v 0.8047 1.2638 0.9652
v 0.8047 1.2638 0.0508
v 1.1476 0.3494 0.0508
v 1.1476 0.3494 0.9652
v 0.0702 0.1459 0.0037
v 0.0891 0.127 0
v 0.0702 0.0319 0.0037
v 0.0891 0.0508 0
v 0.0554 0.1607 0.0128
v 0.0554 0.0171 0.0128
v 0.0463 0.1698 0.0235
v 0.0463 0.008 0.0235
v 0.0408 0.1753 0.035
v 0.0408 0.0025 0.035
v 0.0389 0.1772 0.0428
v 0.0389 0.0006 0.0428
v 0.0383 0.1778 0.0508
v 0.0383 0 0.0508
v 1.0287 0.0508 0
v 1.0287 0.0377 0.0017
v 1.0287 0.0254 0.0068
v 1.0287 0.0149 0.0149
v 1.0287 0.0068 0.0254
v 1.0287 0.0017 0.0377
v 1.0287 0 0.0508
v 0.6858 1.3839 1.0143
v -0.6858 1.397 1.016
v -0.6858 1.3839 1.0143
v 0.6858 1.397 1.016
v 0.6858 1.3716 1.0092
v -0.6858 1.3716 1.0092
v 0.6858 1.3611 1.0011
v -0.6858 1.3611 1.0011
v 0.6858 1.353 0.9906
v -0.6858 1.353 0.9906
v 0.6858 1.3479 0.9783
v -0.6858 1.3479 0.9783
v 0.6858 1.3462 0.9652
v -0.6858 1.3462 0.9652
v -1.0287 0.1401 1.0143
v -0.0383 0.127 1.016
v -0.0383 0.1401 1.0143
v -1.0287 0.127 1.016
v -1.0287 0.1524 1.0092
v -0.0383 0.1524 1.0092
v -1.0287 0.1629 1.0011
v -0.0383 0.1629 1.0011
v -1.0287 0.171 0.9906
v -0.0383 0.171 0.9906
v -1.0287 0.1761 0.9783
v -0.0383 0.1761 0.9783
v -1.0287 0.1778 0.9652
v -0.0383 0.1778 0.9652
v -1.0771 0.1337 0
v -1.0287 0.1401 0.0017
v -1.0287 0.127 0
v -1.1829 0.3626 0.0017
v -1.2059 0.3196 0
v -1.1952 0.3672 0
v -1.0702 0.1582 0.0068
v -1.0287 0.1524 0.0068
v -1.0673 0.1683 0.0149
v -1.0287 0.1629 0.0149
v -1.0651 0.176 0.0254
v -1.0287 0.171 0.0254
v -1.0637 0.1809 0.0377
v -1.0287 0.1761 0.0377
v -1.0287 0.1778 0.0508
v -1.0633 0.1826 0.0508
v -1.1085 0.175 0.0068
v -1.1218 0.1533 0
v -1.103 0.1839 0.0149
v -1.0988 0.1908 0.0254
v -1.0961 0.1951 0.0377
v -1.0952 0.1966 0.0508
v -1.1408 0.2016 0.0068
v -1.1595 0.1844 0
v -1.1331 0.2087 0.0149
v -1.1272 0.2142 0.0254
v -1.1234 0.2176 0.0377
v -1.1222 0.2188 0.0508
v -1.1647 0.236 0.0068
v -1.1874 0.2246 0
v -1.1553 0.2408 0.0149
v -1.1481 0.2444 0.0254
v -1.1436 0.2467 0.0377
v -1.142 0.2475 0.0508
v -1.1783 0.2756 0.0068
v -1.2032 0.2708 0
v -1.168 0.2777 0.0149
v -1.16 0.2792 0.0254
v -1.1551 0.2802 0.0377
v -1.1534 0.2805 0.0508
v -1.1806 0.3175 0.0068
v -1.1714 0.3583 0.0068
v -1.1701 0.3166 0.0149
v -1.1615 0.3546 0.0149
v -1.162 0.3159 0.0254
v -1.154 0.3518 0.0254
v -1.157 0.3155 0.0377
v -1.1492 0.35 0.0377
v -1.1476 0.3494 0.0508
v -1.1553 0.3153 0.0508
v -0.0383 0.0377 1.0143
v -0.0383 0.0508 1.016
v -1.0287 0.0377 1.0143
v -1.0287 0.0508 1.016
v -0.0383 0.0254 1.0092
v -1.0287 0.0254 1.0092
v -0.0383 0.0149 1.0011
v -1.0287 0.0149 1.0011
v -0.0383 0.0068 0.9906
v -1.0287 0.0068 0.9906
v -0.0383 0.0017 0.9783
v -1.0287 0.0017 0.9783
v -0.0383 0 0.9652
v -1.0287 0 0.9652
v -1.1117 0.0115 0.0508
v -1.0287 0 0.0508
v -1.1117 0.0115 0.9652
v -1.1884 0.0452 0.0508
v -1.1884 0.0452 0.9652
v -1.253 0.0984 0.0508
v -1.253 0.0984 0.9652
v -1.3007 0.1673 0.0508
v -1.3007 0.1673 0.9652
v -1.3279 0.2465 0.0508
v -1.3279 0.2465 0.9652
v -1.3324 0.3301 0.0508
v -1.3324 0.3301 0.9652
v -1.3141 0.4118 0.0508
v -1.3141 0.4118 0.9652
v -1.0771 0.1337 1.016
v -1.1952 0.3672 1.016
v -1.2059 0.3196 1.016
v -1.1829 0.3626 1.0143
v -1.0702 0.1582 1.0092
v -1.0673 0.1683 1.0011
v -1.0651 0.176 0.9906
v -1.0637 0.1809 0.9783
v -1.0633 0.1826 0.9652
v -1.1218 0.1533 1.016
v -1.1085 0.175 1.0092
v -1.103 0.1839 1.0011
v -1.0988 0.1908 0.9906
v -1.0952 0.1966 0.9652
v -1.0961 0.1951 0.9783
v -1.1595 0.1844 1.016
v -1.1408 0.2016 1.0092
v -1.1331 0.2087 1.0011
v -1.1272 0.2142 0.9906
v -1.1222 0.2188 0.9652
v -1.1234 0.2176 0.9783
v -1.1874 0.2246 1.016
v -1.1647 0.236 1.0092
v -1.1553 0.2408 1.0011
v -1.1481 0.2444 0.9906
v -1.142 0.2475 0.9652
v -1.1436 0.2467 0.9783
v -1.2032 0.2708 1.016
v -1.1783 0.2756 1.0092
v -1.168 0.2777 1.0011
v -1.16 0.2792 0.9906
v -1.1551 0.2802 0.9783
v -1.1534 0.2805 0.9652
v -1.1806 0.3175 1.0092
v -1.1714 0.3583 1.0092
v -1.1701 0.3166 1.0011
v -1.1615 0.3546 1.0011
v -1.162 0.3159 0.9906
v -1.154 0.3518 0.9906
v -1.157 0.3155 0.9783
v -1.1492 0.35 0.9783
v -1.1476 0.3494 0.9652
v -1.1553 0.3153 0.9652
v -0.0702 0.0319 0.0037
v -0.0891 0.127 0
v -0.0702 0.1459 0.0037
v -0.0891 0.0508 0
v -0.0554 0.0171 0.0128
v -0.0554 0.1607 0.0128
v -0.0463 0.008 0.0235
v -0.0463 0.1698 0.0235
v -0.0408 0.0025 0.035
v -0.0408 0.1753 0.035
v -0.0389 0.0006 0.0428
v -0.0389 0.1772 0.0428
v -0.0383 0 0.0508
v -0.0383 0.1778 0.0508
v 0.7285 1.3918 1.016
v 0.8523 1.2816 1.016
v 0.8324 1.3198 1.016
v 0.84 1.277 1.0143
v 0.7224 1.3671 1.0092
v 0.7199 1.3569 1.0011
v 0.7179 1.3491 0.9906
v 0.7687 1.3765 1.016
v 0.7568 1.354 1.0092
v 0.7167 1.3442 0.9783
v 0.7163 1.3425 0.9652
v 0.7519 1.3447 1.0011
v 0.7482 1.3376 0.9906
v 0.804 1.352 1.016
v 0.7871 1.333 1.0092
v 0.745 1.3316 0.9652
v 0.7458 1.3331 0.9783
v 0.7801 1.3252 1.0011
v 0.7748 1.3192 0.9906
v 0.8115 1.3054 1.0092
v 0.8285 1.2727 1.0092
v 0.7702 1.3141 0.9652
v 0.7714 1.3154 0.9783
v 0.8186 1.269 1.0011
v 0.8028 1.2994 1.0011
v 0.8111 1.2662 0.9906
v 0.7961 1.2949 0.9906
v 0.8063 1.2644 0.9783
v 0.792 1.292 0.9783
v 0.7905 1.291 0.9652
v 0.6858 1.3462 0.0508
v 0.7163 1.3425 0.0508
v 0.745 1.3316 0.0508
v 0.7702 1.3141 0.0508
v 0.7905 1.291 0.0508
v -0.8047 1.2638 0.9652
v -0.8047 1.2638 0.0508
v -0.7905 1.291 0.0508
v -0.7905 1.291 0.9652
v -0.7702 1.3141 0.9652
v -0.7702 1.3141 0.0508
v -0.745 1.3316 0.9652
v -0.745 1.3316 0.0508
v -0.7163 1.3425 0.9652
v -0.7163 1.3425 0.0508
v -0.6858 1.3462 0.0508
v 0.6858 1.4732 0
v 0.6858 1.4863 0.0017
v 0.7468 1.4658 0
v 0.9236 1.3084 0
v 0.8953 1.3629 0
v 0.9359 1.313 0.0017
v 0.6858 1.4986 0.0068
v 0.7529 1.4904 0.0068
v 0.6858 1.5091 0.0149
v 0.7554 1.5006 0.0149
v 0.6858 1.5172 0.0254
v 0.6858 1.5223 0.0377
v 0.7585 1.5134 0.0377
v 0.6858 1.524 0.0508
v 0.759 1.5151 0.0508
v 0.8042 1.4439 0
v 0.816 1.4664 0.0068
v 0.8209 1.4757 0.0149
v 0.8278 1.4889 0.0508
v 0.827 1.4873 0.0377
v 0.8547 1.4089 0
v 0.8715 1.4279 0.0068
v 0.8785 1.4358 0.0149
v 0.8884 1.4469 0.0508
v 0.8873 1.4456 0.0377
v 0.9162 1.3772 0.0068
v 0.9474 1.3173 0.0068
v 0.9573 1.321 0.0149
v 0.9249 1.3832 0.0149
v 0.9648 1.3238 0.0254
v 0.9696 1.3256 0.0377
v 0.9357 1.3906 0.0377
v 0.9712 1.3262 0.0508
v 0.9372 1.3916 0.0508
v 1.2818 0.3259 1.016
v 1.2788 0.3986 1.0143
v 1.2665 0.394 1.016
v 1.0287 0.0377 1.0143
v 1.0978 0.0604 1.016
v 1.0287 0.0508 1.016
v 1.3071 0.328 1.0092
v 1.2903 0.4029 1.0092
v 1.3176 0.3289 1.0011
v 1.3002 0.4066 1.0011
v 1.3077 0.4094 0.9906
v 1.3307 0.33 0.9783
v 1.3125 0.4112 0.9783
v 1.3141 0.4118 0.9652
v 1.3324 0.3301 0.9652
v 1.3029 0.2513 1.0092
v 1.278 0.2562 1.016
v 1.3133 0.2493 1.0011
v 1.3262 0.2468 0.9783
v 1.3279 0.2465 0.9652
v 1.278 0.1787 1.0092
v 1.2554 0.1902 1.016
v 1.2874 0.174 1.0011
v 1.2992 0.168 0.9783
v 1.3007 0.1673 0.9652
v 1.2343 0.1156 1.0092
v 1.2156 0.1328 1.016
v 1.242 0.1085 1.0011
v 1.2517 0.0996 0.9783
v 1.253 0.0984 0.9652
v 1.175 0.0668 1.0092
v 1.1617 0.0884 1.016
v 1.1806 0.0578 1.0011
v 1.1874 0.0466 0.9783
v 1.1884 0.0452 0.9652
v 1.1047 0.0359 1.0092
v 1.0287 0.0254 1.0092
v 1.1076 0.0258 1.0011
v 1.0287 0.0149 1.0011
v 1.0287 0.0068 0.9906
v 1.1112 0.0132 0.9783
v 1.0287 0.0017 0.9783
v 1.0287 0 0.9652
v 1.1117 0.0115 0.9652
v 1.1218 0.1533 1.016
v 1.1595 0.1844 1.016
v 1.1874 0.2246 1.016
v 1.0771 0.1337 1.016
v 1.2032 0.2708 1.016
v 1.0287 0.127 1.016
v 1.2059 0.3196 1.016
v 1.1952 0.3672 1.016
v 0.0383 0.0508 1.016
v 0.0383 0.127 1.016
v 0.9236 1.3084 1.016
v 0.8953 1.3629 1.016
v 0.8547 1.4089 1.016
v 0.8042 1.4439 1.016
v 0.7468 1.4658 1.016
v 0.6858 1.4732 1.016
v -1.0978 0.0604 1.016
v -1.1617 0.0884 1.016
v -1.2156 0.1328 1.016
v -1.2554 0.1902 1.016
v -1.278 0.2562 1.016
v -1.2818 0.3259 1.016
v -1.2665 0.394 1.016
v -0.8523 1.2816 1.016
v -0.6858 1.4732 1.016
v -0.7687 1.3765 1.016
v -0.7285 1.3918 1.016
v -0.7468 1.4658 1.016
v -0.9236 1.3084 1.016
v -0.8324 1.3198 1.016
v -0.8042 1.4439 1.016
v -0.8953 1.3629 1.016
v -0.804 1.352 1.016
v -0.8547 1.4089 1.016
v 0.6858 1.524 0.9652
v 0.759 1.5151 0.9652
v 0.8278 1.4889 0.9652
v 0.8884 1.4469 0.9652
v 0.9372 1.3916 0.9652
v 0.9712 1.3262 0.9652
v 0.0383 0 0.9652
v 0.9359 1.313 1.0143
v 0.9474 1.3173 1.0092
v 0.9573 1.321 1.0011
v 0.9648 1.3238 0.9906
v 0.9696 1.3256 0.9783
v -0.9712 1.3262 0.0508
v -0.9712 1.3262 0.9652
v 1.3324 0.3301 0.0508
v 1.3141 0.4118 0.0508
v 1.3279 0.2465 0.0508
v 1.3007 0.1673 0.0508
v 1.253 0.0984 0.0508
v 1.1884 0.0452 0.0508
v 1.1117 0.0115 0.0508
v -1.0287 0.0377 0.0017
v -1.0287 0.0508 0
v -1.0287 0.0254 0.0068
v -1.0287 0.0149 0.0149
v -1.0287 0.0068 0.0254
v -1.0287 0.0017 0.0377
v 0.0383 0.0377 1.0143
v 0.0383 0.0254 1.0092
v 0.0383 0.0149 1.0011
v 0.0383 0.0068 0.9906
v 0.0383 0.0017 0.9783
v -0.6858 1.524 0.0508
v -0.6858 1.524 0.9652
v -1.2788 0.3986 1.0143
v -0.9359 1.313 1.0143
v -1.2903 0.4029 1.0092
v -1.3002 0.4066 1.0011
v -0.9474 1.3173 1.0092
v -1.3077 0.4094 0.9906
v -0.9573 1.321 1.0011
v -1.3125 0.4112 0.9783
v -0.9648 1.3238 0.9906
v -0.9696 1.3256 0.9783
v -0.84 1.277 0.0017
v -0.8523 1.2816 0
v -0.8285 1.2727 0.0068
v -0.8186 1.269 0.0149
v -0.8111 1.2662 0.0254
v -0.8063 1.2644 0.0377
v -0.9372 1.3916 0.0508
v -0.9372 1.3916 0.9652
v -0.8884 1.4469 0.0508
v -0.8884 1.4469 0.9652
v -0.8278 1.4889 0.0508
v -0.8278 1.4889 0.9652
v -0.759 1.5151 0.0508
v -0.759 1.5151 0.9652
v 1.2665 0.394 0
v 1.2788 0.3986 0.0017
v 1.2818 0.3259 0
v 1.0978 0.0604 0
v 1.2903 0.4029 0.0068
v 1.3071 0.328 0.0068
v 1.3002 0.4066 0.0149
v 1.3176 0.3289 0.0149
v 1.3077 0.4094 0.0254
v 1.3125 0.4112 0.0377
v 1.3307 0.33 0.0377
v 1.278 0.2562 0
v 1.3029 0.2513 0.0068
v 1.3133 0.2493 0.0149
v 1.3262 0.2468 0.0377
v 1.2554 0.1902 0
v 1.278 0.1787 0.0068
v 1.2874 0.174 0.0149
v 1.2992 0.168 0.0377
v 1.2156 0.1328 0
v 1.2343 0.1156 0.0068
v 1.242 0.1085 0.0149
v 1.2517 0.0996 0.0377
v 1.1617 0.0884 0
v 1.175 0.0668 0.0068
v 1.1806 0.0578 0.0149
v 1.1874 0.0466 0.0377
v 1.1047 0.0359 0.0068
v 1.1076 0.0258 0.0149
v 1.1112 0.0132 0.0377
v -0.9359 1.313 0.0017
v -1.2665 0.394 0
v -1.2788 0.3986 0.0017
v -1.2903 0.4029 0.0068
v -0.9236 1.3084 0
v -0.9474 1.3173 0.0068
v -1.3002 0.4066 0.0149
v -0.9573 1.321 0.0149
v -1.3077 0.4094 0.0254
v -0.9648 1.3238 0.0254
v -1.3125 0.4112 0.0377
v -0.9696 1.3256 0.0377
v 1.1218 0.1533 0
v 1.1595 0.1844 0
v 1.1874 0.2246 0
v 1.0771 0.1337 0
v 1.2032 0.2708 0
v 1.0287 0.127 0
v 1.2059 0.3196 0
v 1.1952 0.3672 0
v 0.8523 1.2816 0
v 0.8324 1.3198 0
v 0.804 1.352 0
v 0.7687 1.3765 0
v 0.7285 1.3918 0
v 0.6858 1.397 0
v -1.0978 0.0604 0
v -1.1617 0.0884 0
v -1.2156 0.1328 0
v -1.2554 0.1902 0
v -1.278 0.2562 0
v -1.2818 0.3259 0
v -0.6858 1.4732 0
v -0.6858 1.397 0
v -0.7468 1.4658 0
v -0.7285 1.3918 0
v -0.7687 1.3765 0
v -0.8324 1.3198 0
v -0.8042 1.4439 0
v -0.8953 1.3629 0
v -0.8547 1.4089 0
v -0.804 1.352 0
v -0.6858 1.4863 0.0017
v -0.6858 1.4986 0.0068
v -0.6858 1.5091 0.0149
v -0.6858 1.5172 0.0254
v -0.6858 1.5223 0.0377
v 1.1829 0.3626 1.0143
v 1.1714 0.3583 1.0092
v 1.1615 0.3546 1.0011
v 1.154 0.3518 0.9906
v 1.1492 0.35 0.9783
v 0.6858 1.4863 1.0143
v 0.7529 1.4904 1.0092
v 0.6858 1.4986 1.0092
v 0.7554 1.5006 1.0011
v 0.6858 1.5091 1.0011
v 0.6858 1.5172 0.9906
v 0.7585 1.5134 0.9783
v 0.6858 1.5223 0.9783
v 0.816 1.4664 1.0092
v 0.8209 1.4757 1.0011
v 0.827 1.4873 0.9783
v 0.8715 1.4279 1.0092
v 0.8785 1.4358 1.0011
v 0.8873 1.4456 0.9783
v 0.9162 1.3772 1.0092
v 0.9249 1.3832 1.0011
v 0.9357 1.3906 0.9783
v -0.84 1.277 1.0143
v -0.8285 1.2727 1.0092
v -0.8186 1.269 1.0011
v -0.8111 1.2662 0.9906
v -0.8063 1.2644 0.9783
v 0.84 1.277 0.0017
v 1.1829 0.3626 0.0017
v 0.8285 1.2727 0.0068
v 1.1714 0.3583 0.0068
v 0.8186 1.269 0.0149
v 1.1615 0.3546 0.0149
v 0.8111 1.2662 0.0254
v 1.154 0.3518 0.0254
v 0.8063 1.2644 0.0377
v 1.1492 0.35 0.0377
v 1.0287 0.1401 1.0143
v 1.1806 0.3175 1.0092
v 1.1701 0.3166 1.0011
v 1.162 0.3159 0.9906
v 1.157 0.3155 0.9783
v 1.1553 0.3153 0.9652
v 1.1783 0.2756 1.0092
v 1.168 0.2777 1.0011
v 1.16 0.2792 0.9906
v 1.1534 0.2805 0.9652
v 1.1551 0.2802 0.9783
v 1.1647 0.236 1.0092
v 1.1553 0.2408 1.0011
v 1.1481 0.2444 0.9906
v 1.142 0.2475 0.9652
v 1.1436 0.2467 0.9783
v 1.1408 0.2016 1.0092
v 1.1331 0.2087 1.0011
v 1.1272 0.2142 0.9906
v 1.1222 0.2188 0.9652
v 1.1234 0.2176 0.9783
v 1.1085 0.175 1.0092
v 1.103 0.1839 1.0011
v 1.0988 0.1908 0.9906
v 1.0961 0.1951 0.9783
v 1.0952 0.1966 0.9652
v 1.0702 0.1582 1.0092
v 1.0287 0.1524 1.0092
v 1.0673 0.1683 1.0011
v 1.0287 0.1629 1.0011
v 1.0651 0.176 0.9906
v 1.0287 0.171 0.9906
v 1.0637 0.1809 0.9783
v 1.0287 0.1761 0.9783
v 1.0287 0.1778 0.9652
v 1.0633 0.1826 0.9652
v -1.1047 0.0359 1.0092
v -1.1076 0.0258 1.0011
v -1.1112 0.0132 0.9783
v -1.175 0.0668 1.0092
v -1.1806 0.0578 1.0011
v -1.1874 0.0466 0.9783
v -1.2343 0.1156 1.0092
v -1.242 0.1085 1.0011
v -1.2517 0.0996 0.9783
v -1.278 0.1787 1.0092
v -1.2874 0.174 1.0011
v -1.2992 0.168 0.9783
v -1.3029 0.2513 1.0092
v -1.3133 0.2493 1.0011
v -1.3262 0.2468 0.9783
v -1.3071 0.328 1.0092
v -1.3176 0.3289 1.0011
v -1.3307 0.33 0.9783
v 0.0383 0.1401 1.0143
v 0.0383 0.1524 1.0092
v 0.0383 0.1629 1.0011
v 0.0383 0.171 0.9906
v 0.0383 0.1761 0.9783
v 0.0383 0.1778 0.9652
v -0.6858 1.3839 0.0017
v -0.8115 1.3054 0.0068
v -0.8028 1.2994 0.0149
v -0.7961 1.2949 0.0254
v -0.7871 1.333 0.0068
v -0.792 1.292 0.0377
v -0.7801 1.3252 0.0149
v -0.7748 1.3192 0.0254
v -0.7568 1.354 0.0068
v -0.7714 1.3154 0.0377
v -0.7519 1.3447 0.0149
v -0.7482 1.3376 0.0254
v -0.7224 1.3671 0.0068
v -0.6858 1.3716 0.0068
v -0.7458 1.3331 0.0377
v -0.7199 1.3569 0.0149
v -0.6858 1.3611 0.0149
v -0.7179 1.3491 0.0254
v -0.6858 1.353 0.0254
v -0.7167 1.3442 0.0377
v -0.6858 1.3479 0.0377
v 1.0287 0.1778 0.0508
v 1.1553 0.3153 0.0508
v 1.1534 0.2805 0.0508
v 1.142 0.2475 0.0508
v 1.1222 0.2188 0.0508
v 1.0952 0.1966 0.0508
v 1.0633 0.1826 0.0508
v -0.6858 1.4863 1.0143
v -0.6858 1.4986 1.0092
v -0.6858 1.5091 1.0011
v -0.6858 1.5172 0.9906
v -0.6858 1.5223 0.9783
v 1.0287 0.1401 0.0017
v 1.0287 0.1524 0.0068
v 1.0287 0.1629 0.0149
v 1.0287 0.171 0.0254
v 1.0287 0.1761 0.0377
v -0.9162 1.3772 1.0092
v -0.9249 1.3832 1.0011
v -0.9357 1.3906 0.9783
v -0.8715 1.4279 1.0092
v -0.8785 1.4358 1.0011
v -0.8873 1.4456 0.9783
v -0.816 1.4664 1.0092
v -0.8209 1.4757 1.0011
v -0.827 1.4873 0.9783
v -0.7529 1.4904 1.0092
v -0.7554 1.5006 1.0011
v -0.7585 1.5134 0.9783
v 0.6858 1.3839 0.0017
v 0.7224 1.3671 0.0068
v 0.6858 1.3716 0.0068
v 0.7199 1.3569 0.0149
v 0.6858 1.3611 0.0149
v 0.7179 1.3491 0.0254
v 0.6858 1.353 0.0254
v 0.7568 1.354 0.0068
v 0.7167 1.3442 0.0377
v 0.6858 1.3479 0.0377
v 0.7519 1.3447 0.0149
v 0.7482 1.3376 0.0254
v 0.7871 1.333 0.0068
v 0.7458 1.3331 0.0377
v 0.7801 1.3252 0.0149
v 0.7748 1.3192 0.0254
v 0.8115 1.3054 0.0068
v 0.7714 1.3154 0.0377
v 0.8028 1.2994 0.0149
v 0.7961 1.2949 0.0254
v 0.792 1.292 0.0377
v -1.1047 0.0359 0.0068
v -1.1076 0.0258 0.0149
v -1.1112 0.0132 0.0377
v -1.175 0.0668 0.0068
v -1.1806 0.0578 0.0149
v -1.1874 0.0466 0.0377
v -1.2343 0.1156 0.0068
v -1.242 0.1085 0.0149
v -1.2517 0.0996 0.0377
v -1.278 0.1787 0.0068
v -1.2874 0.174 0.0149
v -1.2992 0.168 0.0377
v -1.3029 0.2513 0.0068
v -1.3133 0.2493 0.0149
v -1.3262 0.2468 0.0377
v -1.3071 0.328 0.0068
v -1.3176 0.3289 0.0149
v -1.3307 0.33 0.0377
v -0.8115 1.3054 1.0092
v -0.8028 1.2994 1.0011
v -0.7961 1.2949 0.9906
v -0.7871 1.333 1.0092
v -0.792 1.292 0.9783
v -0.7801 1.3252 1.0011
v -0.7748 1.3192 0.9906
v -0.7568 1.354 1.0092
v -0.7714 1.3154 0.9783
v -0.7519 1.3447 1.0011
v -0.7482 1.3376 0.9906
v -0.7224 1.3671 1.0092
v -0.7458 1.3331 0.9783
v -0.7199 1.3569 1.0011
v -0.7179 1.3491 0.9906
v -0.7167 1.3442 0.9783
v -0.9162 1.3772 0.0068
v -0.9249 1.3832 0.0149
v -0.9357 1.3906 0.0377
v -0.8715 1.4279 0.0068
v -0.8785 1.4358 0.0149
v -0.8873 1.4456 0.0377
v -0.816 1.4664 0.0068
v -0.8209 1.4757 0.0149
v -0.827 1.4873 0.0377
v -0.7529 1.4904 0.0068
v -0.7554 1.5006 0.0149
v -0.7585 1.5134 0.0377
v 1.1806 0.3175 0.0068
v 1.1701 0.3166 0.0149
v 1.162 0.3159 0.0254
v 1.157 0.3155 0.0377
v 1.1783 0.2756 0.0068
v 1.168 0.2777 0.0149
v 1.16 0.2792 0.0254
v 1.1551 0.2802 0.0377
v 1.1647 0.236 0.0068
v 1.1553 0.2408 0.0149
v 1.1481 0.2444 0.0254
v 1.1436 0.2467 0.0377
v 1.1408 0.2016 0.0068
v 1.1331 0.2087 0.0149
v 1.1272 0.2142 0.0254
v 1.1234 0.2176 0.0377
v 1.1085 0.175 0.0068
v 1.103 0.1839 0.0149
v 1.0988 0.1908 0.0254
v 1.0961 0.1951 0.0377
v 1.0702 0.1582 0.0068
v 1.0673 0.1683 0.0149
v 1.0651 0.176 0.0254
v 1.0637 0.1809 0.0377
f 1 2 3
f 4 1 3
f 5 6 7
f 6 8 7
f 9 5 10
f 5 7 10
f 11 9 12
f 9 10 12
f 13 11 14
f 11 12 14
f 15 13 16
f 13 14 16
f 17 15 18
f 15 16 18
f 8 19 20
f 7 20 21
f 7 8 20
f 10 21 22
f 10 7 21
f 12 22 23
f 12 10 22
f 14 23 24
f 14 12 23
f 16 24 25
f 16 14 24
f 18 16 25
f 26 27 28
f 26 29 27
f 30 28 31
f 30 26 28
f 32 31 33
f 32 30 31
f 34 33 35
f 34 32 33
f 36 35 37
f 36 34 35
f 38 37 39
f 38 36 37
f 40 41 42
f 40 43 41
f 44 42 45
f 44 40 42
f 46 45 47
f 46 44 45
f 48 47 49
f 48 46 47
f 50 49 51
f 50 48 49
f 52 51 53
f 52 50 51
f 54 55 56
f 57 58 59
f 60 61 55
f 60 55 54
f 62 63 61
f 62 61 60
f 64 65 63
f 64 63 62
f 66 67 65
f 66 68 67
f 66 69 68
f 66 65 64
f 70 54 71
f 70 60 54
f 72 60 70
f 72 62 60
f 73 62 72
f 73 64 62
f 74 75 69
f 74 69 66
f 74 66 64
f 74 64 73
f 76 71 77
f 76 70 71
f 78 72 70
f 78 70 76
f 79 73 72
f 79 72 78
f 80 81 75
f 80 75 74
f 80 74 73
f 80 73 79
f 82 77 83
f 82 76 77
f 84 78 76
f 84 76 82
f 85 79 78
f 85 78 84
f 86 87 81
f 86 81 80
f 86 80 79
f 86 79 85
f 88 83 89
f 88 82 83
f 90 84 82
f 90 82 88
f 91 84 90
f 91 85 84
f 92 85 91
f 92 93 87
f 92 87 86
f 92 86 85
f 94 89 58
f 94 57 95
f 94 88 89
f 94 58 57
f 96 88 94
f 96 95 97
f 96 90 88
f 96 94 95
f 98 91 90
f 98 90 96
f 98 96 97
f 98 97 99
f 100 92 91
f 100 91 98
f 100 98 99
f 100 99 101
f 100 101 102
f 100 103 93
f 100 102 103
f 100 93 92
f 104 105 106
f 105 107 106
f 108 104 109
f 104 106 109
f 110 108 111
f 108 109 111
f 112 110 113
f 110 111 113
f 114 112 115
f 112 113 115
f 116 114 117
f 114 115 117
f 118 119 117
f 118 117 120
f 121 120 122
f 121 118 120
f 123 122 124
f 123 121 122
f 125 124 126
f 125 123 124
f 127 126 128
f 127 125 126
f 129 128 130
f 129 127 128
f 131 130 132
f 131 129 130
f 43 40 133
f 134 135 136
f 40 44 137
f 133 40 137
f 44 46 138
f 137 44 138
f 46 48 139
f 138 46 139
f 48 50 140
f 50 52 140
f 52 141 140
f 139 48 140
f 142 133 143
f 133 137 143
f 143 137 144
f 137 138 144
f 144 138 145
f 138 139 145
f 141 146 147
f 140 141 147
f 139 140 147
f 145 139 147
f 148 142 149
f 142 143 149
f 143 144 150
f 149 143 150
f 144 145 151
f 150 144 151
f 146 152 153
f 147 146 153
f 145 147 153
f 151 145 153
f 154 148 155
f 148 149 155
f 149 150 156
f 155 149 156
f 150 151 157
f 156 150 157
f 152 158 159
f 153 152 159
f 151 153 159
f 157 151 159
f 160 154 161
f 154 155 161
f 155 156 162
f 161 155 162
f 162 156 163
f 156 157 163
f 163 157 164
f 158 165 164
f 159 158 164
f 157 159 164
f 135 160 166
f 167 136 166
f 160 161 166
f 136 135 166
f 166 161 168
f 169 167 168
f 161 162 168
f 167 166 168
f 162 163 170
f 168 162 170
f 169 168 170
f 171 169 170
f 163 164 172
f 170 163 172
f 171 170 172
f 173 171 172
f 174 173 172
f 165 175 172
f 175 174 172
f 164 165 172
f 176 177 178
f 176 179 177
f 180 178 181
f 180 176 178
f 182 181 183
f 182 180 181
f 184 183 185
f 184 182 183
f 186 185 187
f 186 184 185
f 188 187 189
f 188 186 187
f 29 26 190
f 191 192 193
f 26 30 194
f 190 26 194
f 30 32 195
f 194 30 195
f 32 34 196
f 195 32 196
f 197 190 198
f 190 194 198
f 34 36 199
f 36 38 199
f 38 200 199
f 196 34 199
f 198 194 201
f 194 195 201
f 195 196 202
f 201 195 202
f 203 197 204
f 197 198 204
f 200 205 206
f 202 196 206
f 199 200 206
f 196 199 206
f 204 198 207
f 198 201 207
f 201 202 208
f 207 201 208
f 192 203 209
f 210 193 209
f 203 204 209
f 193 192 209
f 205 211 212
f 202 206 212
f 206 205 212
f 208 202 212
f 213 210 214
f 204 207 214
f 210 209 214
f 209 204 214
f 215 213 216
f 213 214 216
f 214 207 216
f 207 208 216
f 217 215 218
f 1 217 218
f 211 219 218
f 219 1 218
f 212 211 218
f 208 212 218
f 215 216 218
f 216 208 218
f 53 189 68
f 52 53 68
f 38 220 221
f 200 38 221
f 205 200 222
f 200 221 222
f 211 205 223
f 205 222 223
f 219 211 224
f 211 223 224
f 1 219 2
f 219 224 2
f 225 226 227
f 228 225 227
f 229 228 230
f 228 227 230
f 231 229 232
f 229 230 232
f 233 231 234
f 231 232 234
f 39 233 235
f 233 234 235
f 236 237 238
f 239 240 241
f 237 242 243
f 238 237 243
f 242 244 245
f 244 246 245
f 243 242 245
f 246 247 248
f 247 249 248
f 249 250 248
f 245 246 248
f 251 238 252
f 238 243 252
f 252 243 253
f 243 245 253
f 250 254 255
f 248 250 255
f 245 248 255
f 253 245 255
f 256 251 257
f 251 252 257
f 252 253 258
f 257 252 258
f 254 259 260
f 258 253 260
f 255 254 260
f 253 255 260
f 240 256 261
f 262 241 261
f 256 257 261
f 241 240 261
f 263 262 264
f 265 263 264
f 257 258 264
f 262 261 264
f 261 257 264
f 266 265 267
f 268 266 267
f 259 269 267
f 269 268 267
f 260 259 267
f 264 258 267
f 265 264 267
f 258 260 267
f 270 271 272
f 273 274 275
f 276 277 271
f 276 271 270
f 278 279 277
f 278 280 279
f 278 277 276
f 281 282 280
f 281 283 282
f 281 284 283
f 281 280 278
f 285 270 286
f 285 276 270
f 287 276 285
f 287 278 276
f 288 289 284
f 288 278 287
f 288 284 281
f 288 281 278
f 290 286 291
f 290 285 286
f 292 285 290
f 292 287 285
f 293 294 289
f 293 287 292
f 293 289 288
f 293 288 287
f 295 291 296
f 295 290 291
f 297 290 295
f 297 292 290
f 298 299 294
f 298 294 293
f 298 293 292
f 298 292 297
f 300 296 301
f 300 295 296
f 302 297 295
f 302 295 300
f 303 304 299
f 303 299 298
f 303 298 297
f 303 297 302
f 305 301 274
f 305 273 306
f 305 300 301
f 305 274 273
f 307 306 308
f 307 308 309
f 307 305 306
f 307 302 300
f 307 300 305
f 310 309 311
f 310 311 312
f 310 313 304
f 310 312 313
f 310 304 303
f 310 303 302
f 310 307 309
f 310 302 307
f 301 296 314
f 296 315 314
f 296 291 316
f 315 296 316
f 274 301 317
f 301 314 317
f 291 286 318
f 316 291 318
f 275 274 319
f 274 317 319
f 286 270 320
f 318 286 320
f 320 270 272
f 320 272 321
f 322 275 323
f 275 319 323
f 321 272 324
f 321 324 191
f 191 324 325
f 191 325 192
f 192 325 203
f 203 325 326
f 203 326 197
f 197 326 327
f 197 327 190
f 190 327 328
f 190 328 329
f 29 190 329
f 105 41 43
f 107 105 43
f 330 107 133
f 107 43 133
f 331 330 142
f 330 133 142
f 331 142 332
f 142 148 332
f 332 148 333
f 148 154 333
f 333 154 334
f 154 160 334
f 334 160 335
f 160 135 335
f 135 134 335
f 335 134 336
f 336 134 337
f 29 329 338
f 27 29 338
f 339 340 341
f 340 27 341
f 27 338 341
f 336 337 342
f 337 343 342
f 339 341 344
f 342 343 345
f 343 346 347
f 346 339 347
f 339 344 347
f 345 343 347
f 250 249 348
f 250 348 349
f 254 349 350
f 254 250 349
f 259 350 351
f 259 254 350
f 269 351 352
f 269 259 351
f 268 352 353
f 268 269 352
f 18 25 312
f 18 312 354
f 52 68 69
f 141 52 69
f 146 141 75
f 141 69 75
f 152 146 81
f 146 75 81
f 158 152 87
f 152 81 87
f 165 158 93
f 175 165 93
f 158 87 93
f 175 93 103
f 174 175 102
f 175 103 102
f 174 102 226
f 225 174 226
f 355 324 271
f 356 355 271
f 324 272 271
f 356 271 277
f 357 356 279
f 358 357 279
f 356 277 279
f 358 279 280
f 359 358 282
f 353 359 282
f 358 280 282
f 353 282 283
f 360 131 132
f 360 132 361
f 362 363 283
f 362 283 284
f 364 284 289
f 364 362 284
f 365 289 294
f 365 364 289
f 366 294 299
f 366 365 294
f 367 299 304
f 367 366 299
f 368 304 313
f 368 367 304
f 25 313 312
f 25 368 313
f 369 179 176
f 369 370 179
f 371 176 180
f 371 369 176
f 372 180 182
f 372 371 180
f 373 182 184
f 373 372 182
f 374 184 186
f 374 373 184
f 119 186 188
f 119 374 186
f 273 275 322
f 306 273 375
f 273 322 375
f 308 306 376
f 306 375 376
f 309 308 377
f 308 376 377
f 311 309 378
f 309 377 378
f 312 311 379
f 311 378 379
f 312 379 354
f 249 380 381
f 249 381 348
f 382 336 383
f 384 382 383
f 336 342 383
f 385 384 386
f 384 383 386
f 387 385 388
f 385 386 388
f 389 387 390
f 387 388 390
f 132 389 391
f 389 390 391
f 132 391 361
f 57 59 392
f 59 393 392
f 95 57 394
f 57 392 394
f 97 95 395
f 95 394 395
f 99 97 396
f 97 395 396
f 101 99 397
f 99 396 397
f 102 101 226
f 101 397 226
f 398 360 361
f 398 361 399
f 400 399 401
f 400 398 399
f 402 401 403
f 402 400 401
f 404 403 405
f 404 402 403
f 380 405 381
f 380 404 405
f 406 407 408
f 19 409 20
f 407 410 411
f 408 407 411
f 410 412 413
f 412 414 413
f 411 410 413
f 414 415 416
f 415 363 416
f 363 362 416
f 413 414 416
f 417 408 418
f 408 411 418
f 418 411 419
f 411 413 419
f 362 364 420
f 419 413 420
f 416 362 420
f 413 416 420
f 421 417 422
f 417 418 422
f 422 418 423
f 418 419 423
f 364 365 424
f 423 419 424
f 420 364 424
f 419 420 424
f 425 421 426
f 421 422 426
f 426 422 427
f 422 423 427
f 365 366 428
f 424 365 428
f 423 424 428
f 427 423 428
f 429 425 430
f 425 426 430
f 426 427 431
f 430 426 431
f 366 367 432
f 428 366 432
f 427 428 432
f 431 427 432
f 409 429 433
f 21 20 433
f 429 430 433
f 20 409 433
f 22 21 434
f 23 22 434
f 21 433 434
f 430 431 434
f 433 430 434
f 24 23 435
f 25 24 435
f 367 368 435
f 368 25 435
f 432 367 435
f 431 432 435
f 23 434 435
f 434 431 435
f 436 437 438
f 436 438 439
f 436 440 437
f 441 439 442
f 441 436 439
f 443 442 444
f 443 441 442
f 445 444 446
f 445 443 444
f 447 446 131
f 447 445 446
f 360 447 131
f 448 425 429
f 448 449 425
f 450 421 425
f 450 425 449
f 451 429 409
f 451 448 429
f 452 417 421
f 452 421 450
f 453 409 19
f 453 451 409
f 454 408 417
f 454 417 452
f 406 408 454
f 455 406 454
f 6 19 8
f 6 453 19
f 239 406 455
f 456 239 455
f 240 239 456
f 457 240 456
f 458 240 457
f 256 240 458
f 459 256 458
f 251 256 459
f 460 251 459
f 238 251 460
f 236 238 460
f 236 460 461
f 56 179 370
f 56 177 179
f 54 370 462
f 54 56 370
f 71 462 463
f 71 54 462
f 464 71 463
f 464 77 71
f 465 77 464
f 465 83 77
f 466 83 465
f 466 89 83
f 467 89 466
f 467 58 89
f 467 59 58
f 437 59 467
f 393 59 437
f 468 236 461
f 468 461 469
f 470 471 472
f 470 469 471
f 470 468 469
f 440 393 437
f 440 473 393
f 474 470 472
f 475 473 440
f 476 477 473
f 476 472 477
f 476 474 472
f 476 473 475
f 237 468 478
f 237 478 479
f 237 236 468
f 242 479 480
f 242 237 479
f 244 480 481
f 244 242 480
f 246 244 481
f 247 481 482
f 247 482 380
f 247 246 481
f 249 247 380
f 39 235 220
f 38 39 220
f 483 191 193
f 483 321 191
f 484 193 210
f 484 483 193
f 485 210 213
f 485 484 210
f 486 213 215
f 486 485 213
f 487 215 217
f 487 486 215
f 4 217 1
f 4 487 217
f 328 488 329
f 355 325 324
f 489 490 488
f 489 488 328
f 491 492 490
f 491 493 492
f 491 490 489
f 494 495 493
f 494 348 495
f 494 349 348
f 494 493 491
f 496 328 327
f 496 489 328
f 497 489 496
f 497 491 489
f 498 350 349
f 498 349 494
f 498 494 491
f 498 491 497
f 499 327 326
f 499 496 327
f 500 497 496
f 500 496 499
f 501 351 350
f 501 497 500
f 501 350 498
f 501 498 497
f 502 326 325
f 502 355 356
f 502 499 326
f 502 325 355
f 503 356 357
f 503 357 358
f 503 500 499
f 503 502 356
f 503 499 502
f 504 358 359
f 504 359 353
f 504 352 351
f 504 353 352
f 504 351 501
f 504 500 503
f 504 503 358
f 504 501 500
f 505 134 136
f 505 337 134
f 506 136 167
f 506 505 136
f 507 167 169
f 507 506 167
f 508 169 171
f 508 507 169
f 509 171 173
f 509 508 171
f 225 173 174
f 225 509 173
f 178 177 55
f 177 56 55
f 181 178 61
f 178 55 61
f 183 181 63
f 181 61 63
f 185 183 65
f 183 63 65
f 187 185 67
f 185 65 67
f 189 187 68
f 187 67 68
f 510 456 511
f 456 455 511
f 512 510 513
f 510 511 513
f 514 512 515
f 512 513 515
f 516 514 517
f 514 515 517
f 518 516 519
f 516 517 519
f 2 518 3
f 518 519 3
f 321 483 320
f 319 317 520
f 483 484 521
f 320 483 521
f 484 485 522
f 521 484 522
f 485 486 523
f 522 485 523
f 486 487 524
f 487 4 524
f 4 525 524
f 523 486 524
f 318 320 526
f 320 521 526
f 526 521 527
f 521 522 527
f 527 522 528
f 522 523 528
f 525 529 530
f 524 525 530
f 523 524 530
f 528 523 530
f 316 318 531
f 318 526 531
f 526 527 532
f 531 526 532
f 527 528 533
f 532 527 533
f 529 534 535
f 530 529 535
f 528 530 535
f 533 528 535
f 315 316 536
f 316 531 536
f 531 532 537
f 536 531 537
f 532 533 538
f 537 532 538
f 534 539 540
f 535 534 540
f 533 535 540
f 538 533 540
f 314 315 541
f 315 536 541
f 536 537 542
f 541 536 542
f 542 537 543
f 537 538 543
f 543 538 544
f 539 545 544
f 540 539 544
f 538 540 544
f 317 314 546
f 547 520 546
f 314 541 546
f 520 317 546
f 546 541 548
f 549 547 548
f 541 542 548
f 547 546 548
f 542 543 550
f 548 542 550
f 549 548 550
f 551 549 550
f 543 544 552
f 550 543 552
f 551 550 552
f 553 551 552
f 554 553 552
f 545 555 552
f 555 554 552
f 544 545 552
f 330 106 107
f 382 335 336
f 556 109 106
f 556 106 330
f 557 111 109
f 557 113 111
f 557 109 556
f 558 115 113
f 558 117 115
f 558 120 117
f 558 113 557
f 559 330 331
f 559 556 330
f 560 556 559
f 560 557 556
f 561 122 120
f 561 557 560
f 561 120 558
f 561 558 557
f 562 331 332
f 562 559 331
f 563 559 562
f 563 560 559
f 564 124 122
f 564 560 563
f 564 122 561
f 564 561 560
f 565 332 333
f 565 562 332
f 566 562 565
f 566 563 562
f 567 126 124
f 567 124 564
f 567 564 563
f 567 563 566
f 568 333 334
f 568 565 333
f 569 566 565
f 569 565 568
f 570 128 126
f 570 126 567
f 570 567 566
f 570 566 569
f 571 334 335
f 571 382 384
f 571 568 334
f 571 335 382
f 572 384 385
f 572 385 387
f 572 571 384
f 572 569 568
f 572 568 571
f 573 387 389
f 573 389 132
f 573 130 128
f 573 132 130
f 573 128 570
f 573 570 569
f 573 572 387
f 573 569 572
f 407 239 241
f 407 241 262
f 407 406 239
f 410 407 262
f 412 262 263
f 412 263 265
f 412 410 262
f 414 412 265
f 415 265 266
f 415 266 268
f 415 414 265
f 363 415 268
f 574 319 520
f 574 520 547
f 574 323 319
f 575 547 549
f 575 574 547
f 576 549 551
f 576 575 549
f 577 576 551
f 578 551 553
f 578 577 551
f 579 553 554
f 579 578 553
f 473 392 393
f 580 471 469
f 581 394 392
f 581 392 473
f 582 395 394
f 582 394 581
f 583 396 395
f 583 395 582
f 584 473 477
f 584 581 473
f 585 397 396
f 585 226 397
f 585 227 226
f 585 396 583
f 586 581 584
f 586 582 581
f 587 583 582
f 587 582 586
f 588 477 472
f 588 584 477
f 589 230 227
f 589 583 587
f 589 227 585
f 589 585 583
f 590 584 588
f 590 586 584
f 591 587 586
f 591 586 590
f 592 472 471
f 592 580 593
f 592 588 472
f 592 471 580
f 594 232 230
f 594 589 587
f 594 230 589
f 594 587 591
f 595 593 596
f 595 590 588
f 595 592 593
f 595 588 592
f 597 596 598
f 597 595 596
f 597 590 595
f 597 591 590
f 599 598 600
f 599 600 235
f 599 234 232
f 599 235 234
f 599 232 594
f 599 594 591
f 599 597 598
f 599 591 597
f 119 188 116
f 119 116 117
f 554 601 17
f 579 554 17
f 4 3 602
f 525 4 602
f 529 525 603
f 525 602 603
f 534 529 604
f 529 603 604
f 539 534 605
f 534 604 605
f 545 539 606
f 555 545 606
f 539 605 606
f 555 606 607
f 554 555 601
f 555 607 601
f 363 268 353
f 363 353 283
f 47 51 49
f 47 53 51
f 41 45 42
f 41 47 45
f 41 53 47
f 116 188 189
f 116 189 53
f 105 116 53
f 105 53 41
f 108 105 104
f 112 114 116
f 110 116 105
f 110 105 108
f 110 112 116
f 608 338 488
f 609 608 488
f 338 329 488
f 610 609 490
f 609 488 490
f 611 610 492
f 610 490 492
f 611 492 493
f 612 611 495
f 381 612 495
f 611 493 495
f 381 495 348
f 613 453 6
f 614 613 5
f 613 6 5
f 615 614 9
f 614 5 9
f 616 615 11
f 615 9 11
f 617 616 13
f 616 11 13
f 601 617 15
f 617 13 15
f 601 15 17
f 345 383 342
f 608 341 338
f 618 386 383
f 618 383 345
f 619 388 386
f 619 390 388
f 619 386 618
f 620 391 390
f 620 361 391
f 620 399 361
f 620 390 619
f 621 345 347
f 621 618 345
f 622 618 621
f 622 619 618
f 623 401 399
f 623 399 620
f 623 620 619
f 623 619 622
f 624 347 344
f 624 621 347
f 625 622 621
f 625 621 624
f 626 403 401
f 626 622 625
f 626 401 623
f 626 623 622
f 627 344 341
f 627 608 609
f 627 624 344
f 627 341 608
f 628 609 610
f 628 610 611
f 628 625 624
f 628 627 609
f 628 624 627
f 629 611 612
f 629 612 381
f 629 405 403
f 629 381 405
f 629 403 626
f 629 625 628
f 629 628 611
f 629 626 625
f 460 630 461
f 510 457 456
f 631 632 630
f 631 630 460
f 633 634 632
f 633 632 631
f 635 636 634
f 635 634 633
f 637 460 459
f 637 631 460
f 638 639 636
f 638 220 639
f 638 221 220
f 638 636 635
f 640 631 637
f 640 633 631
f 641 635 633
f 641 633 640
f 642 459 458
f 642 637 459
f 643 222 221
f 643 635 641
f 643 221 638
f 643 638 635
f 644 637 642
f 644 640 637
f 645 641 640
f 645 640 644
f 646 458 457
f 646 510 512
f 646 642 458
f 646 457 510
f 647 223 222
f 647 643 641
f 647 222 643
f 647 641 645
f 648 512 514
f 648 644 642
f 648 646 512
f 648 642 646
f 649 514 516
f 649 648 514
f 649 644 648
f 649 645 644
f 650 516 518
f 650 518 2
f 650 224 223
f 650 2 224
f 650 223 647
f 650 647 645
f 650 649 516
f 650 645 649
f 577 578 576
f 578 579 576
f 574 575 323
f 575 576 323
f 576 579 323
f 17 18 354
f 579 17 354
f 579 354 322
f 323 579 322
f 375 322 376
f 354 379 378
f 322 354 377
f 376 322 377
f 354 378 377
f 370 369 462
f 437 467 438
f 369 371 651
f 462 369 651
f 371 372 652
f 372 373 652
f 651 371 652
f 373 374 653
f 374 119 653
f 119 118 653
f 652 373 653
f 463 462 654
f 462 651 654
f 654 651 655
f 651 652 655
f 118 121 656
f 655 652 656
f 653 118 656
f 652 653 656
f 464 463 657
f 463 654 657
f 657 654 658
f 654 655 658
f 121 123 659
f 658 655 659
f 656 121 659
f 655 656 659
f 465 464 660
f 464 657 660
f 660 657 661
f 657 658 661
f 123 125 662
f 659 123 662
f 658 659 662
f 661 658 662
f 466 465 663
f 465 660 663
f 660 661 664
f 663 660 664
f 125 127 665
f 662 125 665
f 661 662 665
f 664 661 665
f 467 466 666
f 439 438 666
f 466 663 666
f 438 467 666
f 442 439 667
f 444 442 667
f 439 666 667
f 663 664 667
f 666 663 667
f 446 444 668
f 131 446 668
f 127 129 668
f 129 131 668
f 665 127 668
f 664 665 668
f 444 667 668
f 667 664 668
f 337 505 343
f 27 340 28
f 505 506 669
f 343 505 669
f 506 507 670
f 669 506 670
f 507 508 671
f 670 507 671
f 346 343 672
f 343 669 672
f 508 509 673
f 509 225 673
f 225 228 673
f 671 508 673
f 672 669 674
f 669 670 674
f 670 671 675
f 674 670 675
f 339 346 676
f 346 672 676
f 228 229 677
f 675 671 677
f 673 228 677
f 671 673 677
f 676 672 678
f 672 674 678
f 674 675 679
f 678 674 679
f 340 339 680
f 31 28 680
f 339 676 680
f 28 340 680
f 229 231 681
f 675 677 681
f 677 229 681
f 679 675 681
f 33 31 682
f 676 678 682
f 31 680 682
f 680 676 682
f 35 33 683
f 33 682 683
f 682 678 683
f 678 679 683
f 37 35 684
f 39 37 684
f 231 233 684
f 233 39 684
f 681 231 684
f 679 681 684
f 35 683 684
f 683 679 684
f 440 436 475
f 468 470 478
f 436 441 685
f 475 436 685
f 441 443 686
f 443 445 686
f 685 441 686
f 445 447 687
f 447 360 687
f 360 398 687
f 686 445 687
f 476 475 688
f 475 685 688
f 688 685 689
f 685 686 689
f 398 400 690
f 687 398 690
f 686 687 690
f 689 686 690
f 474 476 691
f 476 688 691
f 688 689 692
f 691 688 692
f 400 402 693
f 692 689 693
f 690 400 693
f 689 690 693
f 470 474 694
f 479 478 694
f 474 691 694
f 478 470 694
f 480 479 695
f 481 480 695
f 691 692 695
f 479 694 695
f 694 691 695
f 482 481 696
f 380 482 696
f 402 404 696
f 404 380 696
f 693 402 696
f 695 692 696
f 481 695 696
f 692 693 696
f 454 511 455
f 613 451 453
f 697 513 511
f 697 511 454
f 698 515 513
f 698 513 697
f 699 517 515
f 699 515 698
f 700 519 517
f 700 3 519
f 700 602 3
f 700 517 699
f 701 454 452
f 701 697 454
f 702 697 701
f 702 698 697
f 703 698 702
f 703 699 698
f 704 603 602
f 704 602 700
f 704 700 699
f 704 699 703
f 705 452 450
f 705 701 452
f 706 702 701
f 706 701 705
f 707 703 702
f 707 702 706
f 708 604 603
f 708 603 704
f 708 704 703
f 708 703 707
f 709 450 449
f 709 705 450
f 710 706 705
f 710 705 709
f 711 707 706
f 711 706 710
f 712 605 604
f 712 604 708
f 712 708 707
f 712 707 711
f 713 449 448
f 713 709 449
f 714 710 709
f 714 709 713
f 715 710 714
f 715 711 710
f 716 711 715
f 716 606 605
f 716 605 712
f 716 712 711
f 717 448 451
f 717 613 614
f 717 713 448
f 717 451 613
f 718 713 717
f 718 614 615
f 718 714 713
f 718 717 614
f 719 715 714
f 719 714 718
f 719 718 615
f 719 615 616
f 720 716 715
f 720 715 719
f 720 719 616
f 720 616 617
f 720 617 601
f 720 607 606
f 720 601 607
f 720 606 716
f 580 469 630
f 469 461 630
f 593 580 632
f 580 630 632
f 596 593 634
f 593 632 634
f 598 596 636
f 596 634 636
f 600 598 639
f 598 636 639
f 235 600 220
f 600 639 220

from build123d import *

# Parameters (mm, degrees)
BOSS_EXTRUDE1_DEPTH = 1.016
SHELL1_T            = -0.1778
SKETCH2_W           = 0.076603022
SKETCH2_H           = 1.147176972
CUT_EXTRUDE1_DEPTH  = 0.8128
FILLET7_R           = 0.0508


with BuildPart() as part:
    # Sketch1 → Boss-Extrude1 (new body)
    with BuildSketch(Plane.XY):
        with BuildLine():
            Line((-0.6858, 1.524), (0.6858, 1.524))
            ThreePointArc((0.6858, 1.524), (0.859412507, 1.469722928), (0.971193133, 1.326222425))
            Line((0.971193133, 1.326222425), (1.314093133, 0.411822425))
            ThreePointArc((1.314093133, 0.411822425), (1.279222928, 0.131187493), (1.0287, 0))
            Line((1.0287, 0), (-1.0287, 0))
            ThreePointArc((-1.0287, 0), (-1.279222928, 0.131187493), (-1.314093133, 0.411822425))
            Line((-1.314093133, 0.411822425), (-0.971193133, 1.326222425))
            ThreePointArc((-0.971193133, 1.326222425), (-0.859412507, 1.469722928), (-0.6858, 1.524))
        make_face()
    extrude(amount=BOSS_EXTRUDE1_DEPTH)

    # Shell1
    shell1_openings = [part.faces().sort_by_distance(p)[0] for p in [
        (0, 0.71233497, 1.016),
        (0, 0.71233497, 0),
    ]]
    offset(amount=SHELL1_T, openings=shell1_openings, kind=Kind.INTERSECTION)

    # Sketch2 → Cut-Extrude1 (cut)
    with BuildSketch(Plane.XZ):
        with Locations((0, 0.508)):
            Rectangle(SKETCH2_W, SKETCH2_H)
    extrude(amount=-CUT_EXTRUDE1_DEPTH, mode=Mode.SUBTRACT)

    # Fillet7
    fillet7_edges = [part.edges().sort_by_distance(p)[0] for p in [
        (-1.279222928, 0.131187493, 1.016),
        (-1.142643133, 0.869022425, 0),
        (-0.859412507, 1.469722928, 0),
        (-0.533500756, 0, 1.016),
        (1.279222928, 0.131187493, 1.016),
        (1.142643133, 0.869022425, 1.016),
        (0.859412507, 1.469722928, 1.016),
        (0, 1.524, 1.016),
        (-0.758138544, 1.323584553, 0),
        (-0.976163806, 0.806592677, 0),
        (-1.133084553, 0.232461456, 0),
        (-0.533500756, 0.1778, 0),
        (1.133084553, 0.232461456, 0),
        (0.976163806, 0.806592677, 0),
        (0.758138544, 1.323584553, 0),
        (0, 1.3462, 0),
        (-0.758138544, 1.323584553, 1.016),
        (-0.976163806, 0.806592677, 1.016),
        (-1.133084553, 0.232461456, 1.016),
        (-0.533500756, 0.1778, 1.016),
        (1.133084553, 0.232461456, 1.016),
        (0.976163806, 0.806592677, 1.016),
        (0.758138544, 1.323584553, 1.016),
        (0, 1.3462, 1.016),
        (-0.859412507, 1.469722928, 1.016),
        (0.533500756, 0.1778, 0),
        (0.533500756, 0.1778, 1.016),
        (0.533500756, 0, 0),
        (0.533500756, 0, 1.016),
        (-0.038301511, 0.0889, 0),
        (0.038301511, 0.0889, 0),
        (-1.142643133, 0.869022425, 1.016),
        (0, 1.524, 0),
        (0.859412507, 1.469722928, 0),
        (1.142643133, 0.869022425, 0),
        (1.279222928, 0.131187493, 0),
        (-0.533500756, 0, 0),
        (-1.279222928, 0.131187493, 0),
    ]]
    fillet(fillet7_edges, radius=FILLET7_R)


solid = part.part
